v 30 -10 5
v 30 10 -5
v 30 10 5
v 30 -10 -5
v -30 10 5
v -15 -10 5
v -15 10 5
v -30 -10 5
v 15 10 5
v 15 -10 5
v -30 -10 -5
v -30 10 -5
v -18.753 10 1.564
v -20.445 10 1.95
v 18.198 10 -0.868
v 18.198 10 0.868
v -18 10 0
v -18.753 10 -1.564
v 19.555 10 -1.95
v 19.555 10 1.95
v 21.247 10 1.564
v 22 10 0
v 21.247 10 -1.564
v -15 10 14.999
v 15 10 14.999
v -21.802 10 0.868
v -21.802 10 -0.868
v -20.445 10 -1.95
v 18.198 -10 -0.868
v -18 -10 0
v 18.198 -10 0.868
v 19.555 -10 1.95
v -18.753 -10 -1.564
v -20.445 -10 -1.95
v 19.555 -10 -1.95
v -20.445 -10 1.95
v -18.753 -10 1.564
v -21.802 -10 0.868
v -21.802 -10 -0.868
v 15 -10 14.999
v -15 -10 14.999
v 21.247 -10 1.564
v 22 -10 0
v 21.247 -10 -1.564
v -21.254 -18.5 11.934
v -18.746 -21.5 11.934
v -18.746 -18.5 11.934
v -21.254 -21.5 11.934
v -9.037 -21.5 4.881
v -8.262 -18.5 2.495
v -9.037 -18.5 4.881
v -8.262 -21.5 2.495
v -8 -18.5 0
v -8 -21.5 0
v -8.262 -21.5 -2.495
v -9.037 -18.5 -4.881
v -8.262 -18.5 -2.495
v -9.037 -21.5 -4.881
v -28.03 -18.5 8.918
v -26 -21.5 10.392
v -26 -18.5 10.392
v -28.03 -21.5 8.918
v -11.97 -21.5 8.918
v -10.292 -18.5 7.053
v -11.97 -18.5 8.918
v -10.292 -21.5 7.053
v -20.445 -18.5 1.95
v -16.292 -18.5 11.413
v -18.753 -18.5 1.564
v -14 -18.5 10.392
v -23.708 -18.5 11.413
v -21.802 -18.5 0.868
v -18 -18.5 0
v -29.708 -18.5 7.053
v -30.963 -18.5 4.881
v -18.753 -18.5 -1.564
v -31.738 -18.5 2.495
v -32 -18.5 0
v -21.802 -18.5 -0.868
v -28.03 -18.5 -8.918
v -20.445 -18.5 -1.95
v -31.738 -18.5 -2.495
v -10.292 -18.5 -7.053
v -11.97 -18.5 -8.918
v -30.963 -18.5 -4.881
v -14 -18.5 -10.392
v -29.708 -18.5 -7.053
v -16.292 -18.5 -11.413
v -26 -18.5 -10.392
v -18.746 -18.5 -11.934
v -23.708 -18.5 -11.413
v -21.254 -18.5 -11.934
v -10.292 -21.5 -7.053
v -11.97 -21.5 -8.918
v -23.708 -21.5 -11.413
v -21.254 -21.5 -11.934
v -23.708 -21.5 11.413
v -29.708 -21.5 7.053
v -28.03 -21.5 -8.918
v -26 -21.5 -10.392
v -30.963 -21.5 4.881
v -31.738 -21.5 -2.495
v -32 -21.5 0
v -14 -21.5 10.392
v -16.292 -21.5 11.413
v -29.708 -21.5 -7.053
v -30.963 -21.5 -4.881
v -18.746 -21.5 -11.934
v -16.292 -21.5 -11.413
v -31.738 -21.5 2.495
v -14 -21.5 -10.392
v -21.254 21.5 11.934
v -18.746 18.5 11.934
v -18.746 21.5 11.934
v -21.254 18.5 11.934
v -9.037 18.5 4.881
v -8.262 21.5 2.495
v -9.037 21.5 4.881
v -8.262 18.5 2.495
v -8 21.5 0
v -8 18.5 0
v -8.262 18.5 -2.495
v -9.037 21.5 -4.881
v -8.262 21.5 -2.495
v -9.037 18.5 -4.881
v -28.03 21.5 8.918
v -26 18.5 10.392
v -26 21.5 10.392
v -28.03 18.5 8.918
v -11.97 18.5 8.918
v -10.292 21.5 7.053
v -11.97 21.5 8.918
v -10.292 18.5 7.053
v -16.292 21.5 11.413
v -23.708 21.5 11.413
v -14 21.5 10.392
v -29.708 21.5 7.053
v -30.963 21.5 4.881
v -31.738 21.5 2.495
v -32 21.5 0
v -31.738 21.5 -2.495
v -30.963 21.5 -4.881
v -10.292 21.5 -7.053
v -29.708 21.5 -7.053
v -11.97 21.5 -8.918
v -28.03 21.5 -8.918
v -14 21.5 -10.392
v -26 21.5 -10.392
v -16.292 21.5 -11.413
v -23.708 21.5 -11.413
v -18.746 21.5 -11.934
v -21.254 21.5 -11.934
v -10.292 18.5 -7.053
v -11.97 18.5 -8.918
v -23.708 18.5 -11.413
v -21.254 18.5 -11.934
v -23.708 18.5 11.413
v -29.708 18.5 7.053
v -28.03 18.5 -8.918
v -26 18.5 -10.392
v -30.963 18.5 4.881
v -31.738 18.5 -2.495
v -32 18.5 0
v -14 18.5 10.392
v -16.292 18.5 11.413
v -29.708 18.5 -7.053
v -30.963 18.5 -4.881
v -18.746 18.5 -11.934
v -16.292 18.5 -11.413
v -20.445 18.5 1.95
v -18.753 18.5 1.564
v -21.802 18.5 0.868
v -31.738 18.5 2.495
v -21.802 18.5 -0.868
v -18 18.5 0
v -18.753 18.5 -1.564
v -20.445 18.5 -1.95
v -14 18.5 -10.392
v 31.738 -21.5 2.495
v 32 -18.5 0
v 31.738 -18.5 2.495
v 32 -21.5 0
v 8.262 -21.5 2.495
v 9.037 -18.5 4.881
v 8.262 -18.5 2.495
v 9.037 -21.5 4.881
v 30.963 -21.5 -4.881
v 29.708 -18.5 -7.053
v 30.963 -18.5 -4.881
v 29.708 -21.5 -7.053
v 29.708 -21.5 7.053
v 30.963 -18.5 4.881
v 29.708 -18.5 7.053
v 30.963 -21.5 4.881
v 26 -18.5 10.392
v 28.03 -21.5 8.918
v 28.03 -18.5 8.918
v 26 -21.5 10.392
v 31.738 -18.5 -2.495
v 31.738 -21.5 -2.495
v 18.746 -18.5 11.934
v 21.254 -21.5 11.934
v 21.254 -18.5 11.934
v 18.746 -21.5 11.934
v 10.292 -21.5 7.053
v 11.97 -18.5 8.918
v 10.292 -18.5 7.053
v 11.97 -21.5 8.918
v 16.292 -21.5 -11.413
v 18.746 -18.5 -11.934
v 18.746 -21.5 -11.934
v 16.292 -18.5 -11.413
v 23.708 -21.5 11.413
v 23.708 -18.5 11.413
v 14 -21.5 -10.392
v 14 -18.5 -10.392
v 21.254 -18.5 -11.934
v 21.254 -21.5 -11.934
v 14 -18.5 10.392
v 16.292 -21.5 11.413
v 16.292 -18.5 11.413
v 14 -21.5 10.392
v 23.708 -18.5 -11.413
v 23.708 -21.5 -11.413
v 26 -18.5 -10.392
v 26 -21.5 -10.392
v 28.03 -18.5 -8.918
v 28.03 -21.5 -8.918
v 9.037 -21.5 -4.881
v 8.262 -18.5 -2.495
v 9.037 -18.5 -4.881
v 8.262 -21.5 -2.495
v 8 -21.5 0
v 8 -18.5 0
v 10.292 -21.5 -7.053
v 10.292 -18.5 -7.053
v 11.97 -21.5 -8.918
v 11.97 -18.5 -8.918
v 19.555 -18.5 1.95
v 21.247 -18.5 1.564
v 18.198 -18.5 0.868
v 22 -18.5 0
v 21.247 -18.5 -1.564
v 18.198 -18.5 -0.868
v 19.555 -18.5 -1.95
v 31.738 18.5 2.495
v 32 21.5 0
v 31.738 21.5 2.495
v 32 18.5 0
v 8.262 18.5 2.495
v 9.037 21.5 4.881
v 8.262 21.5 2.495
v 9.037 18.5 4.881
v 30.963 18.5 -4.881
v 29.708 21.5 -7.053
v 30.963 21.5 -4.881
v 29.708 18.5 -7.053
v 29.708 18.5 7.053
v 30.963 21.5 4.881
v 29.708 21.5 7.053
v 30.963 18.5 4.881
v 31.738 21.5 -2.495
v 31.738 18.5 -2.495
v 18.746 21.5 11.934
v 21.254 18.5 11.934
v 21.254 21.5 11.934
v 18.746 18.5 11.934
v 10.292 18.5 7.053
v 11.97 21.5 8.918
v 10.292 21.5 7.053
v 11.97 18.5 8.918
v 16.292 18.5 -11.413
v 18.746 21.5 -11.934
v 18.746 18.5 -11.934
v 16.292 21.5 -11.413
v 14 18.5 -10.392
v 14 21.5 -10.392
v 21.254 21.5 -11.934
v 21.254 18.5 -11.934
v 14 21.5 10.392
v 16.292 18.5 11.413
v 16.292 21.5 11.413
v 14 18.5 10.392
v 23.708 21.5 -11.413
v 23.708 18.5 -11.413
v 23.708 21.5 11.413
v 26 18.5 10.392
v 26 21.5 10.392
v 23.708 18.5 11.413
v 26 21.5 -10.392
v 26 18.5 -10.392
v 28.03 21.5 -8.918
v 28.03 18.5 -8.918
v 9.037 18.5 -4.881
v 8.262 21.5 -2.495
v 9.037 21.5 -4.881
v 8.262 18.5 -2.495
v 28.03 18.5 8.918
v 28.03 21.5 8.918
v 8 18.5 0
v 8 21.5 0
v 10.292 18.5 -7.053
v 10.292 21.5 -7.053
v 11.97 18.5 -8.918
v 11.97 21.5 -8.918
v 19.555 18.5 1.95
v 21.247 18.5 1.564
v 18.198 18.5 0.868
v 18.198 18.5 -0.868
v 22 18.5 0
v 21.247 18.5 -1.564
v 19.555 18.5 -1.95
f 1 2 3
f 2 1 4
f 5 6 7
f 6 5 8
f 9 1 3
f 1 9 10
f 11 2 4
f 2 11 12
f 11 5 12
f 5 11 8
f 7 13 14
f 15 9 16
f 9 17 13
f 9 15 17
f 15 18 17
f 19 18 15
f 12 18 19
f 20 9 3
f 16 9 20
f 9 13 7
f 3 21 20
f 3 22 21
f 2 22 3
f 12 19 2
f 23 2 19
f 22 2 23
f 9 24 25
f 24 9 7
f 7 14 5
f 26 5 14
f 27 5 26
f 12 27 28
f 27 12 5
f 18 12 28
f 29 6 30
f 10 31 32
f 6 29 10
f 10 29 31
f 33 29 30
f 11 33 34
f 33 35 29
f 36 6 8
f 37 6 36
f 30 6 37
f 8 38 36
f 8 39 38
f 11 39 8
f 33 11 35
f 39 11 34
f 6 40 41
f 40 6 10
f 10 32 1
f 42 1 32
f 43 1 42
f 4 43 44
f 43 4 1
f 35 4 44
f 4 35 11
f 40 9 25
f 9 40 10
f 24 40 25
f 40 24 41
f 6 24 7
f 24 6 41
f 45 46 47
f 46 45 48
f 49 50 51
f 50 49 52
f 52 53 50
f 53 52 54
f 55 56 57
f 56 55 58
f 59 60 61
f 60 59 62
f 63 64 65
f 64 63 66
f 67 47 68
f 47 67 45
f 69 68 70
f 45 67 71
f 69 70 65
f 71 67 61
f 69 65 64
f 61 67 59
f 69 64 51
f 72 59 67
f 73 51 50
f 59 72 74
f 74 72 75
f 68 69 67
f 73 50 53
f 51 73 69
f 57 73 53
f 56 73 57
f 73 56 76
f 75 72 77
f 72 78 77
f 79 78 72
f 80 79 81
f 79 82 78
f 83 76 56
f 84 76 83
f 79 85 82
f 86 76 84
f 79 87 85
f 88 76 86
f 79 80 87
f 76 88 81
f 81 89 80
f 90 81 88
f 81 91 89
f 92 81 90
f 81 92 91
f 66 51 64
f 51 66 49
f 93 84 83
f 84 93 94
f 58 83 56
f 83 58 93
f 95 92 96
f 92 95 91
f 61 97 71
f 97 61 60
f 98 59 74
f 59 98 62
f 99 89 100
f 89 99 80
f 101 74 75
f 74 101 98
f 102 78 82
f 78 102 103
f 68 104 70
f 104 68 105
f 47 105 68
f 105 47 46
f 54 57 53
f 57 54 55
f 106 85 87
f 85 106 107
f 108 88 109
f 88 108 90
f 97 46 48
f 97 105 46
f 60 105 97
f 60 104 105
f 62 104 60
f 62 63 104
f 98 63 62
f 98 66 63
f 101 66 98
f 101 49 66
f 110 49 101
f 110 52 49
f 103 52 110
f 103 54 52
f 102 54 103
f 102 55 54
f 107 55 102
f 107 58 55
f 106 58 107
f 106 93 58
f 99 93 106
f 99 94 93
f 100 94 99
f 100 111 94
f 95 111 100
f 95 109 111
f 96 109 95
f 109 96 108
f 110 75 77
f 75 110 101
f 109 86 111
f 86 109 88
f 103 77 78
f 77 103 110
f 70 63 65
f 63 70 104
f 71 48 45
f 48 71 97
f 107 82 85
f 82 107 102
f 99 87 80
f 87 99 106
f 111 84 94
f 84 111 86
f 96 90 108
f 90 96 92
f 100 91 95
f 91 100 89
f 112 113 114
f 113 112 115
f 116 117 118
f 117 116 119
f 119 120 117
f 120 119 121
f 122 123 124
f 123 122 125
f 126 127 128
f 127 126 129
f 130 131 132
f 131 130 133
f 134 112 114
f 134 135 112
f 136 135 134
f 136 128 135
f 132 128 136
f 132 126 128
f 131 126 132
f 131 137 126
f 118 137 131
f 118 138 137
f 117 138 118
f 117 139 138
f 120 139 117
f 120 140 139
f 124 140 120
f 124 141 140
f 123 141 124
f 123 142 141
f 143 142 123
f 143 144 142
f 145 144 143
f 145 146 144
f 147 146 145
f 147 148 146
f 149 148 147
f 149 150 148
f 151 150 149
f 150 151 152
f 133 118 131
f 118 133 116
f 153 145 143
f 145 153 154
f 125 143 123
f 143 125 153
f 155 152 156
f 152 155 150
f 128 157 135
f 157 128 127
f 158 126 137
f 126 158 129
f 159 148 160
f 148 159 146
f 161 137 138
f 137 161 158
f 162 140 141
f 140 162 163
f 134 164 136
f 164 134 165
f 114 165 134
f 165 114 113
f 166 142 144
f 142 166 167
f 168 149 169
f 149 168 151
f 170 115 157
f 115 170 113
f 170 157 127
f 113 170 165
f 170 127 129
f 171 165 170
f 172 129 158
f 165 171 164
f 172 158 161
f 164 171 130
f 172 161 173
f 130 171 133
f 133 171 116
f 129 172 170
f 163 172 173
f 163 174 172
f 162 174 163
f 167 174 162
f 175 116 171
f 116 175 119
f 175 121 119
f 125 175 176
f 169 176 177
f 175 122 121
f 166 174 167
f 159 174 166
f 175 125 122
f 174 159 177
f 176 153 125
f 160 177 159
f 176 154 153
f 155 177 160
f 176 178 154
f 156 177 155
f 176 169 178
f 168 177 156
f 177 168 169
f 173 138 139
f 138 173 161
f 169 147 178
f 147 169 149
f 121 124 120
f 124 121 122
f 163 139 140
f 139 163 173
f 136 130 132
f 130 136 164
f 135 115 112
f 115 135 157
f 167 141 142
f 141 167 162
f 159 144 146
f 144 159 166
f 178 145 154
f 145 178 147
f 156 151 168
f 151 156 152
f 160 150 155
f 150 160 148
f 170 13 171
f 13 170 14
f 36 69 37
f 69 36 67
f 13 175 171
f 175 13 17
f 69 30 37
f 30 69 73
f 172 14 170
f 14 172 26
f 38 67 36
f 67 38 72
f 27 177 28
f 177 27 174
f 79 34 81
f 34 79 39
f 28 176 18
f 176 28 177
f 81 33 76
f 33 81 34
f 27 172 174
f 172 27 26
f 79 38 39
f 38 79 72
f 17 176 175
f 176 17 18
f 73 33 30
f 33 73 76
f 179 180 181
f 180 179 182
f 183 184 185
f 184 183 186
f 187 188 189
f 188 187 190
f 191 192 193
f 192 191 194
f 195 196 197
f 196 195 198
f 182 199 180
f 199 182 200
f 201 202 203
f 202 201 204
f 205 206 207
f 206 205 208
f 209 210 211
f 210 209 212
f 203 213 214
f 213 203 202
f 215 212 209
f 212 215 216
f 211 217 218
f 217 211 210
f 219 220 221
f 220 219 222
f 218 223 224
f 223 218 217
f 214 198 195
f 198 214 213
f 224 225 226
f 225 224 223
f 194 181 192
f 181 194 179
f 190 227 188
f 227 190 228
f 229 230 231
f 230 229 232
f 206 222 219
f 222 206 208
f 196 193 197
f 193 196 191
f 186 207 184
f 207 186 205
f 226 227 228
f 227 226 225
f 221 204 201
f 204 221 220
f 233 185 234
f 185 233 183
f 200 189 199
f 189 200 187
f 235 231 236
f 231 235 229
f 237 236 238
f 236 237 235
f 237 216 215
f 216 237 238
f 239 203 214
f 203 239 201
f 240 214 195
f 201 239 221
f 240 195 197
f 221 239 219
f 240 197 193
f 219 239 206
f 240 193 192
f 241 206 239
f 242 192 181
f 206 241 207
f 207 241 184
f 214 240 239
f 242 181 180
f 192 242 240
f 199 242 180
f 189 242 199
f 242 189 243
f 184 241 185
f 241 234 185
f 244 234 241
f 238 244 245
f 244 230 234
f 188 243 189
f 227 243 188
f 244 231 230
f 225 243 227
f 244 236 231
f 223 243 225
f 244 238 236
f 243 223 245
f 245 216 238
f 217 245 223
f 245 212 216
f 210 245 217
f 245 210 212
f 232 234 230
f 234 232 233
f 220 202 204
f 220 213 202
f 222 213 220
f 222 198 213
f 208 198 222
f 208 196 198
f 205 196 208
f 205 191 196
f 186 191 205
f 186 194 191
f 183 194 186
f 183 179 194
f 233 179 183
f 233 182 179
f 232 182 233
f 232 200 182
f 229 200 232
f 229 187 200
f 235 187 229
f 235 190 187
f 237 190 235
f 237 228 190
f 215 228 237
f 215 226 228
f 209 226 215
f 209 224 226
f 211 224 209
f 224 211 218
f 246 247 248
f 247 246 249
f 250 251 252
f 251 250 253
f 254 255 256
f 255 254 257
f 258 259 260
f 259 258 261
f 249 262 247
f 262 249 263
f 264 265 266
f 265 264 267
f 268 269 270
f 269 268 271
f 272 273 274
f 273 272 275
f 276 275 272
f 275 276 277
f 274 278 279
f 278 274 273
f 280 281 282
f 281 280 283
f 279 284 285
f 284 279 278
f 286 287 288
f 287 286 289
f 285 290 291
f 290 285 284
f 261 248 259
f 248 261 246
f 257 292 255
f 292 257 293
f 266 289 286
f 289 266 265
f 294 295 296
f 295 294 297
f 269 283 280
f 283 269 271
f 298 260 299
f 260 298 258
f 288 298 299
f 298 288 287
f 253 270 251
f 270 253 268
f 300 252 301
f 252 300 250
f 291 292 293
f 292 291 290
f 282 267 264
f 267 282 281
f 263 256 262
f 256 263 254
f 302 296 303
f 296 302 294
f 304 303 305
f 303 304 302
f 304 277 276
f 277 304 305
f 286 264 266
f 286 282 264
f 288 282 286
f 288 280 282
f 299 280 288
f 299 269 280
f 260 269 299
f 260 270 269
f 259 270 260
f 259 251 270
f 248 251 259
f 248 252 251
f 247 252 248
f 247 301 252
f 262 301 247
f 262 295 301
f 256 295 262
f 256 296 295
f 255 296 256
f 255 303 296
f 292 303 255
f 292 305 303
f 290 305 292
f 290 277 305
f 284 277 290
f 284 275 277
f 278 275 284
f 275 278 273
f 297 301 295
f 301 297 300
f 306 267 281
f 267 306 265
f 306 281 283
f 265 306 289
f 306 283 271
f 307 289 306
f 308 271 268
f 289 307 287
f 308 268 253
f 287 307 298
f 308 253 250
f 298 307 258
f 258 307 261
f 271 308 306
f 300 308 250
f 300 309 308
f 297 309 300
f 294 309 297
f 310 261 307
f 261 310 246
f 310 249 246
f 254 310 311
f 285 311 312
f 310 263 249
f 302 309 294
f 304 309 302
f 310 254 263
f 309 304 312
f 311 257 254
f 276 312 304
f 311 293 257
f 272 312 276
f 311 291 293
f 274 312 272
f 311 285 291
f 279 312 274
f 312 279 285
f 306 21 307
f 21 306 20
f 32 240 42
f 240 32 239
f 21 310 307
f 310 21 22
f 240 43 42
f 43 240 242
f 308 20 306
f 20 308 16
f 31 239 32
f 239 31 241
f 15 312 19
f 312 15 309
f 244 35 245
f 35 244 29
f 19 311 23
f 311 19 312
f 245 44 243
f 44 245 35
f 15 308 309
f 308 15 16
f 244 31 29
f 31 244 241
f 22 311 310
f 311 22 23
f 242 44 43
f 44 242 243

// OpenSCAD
base_height = 10;
body_width = 20;
cube([60,body_width,base_height],center=true);

top_height = 10;
translate([0,0,(base_height+top_height)/2-0.001])
    cube([30,body_width,top_height],center=true);

// If multiple assignments to a variable exist, OpenSCAD uses the value of the last assignment. 
// A variable assignment within { curly braces } only applies within those braces. Duplicate assignments at different levels of brace enclosure are not considered to conflict.

wheel_radius = 12;
track = 40;
// left front wheel
translate([-20,-track/2,0])
rotate([90,0,0])
    cylinder(h=3, r=wheel_radius, center=true);

// right front wheel
translate([-20,track/2,0])
rotate([90,0,0])
    cylinder(h=3, r=wheel_radius, center=true);
    
// front axis
translate([-20,0,0])
rotate([90,0,0])
    cylinder(h=track, r=2, center=true);
    
// left back wheel
translate([20,-track/2,0])
rotate([90,0,0])
    cylinder(h=3, r=wheel_radius, center=true);
    
// right back wheel
translate([20,track/2,0])
rotate([90,0,0])
    cylinder(h=3, r=wheel_radius, center=true);
    
// back axis
translate([20,0,0])
rotate([90,0,0])
    cylinder(h=track, r=2, center=true);
